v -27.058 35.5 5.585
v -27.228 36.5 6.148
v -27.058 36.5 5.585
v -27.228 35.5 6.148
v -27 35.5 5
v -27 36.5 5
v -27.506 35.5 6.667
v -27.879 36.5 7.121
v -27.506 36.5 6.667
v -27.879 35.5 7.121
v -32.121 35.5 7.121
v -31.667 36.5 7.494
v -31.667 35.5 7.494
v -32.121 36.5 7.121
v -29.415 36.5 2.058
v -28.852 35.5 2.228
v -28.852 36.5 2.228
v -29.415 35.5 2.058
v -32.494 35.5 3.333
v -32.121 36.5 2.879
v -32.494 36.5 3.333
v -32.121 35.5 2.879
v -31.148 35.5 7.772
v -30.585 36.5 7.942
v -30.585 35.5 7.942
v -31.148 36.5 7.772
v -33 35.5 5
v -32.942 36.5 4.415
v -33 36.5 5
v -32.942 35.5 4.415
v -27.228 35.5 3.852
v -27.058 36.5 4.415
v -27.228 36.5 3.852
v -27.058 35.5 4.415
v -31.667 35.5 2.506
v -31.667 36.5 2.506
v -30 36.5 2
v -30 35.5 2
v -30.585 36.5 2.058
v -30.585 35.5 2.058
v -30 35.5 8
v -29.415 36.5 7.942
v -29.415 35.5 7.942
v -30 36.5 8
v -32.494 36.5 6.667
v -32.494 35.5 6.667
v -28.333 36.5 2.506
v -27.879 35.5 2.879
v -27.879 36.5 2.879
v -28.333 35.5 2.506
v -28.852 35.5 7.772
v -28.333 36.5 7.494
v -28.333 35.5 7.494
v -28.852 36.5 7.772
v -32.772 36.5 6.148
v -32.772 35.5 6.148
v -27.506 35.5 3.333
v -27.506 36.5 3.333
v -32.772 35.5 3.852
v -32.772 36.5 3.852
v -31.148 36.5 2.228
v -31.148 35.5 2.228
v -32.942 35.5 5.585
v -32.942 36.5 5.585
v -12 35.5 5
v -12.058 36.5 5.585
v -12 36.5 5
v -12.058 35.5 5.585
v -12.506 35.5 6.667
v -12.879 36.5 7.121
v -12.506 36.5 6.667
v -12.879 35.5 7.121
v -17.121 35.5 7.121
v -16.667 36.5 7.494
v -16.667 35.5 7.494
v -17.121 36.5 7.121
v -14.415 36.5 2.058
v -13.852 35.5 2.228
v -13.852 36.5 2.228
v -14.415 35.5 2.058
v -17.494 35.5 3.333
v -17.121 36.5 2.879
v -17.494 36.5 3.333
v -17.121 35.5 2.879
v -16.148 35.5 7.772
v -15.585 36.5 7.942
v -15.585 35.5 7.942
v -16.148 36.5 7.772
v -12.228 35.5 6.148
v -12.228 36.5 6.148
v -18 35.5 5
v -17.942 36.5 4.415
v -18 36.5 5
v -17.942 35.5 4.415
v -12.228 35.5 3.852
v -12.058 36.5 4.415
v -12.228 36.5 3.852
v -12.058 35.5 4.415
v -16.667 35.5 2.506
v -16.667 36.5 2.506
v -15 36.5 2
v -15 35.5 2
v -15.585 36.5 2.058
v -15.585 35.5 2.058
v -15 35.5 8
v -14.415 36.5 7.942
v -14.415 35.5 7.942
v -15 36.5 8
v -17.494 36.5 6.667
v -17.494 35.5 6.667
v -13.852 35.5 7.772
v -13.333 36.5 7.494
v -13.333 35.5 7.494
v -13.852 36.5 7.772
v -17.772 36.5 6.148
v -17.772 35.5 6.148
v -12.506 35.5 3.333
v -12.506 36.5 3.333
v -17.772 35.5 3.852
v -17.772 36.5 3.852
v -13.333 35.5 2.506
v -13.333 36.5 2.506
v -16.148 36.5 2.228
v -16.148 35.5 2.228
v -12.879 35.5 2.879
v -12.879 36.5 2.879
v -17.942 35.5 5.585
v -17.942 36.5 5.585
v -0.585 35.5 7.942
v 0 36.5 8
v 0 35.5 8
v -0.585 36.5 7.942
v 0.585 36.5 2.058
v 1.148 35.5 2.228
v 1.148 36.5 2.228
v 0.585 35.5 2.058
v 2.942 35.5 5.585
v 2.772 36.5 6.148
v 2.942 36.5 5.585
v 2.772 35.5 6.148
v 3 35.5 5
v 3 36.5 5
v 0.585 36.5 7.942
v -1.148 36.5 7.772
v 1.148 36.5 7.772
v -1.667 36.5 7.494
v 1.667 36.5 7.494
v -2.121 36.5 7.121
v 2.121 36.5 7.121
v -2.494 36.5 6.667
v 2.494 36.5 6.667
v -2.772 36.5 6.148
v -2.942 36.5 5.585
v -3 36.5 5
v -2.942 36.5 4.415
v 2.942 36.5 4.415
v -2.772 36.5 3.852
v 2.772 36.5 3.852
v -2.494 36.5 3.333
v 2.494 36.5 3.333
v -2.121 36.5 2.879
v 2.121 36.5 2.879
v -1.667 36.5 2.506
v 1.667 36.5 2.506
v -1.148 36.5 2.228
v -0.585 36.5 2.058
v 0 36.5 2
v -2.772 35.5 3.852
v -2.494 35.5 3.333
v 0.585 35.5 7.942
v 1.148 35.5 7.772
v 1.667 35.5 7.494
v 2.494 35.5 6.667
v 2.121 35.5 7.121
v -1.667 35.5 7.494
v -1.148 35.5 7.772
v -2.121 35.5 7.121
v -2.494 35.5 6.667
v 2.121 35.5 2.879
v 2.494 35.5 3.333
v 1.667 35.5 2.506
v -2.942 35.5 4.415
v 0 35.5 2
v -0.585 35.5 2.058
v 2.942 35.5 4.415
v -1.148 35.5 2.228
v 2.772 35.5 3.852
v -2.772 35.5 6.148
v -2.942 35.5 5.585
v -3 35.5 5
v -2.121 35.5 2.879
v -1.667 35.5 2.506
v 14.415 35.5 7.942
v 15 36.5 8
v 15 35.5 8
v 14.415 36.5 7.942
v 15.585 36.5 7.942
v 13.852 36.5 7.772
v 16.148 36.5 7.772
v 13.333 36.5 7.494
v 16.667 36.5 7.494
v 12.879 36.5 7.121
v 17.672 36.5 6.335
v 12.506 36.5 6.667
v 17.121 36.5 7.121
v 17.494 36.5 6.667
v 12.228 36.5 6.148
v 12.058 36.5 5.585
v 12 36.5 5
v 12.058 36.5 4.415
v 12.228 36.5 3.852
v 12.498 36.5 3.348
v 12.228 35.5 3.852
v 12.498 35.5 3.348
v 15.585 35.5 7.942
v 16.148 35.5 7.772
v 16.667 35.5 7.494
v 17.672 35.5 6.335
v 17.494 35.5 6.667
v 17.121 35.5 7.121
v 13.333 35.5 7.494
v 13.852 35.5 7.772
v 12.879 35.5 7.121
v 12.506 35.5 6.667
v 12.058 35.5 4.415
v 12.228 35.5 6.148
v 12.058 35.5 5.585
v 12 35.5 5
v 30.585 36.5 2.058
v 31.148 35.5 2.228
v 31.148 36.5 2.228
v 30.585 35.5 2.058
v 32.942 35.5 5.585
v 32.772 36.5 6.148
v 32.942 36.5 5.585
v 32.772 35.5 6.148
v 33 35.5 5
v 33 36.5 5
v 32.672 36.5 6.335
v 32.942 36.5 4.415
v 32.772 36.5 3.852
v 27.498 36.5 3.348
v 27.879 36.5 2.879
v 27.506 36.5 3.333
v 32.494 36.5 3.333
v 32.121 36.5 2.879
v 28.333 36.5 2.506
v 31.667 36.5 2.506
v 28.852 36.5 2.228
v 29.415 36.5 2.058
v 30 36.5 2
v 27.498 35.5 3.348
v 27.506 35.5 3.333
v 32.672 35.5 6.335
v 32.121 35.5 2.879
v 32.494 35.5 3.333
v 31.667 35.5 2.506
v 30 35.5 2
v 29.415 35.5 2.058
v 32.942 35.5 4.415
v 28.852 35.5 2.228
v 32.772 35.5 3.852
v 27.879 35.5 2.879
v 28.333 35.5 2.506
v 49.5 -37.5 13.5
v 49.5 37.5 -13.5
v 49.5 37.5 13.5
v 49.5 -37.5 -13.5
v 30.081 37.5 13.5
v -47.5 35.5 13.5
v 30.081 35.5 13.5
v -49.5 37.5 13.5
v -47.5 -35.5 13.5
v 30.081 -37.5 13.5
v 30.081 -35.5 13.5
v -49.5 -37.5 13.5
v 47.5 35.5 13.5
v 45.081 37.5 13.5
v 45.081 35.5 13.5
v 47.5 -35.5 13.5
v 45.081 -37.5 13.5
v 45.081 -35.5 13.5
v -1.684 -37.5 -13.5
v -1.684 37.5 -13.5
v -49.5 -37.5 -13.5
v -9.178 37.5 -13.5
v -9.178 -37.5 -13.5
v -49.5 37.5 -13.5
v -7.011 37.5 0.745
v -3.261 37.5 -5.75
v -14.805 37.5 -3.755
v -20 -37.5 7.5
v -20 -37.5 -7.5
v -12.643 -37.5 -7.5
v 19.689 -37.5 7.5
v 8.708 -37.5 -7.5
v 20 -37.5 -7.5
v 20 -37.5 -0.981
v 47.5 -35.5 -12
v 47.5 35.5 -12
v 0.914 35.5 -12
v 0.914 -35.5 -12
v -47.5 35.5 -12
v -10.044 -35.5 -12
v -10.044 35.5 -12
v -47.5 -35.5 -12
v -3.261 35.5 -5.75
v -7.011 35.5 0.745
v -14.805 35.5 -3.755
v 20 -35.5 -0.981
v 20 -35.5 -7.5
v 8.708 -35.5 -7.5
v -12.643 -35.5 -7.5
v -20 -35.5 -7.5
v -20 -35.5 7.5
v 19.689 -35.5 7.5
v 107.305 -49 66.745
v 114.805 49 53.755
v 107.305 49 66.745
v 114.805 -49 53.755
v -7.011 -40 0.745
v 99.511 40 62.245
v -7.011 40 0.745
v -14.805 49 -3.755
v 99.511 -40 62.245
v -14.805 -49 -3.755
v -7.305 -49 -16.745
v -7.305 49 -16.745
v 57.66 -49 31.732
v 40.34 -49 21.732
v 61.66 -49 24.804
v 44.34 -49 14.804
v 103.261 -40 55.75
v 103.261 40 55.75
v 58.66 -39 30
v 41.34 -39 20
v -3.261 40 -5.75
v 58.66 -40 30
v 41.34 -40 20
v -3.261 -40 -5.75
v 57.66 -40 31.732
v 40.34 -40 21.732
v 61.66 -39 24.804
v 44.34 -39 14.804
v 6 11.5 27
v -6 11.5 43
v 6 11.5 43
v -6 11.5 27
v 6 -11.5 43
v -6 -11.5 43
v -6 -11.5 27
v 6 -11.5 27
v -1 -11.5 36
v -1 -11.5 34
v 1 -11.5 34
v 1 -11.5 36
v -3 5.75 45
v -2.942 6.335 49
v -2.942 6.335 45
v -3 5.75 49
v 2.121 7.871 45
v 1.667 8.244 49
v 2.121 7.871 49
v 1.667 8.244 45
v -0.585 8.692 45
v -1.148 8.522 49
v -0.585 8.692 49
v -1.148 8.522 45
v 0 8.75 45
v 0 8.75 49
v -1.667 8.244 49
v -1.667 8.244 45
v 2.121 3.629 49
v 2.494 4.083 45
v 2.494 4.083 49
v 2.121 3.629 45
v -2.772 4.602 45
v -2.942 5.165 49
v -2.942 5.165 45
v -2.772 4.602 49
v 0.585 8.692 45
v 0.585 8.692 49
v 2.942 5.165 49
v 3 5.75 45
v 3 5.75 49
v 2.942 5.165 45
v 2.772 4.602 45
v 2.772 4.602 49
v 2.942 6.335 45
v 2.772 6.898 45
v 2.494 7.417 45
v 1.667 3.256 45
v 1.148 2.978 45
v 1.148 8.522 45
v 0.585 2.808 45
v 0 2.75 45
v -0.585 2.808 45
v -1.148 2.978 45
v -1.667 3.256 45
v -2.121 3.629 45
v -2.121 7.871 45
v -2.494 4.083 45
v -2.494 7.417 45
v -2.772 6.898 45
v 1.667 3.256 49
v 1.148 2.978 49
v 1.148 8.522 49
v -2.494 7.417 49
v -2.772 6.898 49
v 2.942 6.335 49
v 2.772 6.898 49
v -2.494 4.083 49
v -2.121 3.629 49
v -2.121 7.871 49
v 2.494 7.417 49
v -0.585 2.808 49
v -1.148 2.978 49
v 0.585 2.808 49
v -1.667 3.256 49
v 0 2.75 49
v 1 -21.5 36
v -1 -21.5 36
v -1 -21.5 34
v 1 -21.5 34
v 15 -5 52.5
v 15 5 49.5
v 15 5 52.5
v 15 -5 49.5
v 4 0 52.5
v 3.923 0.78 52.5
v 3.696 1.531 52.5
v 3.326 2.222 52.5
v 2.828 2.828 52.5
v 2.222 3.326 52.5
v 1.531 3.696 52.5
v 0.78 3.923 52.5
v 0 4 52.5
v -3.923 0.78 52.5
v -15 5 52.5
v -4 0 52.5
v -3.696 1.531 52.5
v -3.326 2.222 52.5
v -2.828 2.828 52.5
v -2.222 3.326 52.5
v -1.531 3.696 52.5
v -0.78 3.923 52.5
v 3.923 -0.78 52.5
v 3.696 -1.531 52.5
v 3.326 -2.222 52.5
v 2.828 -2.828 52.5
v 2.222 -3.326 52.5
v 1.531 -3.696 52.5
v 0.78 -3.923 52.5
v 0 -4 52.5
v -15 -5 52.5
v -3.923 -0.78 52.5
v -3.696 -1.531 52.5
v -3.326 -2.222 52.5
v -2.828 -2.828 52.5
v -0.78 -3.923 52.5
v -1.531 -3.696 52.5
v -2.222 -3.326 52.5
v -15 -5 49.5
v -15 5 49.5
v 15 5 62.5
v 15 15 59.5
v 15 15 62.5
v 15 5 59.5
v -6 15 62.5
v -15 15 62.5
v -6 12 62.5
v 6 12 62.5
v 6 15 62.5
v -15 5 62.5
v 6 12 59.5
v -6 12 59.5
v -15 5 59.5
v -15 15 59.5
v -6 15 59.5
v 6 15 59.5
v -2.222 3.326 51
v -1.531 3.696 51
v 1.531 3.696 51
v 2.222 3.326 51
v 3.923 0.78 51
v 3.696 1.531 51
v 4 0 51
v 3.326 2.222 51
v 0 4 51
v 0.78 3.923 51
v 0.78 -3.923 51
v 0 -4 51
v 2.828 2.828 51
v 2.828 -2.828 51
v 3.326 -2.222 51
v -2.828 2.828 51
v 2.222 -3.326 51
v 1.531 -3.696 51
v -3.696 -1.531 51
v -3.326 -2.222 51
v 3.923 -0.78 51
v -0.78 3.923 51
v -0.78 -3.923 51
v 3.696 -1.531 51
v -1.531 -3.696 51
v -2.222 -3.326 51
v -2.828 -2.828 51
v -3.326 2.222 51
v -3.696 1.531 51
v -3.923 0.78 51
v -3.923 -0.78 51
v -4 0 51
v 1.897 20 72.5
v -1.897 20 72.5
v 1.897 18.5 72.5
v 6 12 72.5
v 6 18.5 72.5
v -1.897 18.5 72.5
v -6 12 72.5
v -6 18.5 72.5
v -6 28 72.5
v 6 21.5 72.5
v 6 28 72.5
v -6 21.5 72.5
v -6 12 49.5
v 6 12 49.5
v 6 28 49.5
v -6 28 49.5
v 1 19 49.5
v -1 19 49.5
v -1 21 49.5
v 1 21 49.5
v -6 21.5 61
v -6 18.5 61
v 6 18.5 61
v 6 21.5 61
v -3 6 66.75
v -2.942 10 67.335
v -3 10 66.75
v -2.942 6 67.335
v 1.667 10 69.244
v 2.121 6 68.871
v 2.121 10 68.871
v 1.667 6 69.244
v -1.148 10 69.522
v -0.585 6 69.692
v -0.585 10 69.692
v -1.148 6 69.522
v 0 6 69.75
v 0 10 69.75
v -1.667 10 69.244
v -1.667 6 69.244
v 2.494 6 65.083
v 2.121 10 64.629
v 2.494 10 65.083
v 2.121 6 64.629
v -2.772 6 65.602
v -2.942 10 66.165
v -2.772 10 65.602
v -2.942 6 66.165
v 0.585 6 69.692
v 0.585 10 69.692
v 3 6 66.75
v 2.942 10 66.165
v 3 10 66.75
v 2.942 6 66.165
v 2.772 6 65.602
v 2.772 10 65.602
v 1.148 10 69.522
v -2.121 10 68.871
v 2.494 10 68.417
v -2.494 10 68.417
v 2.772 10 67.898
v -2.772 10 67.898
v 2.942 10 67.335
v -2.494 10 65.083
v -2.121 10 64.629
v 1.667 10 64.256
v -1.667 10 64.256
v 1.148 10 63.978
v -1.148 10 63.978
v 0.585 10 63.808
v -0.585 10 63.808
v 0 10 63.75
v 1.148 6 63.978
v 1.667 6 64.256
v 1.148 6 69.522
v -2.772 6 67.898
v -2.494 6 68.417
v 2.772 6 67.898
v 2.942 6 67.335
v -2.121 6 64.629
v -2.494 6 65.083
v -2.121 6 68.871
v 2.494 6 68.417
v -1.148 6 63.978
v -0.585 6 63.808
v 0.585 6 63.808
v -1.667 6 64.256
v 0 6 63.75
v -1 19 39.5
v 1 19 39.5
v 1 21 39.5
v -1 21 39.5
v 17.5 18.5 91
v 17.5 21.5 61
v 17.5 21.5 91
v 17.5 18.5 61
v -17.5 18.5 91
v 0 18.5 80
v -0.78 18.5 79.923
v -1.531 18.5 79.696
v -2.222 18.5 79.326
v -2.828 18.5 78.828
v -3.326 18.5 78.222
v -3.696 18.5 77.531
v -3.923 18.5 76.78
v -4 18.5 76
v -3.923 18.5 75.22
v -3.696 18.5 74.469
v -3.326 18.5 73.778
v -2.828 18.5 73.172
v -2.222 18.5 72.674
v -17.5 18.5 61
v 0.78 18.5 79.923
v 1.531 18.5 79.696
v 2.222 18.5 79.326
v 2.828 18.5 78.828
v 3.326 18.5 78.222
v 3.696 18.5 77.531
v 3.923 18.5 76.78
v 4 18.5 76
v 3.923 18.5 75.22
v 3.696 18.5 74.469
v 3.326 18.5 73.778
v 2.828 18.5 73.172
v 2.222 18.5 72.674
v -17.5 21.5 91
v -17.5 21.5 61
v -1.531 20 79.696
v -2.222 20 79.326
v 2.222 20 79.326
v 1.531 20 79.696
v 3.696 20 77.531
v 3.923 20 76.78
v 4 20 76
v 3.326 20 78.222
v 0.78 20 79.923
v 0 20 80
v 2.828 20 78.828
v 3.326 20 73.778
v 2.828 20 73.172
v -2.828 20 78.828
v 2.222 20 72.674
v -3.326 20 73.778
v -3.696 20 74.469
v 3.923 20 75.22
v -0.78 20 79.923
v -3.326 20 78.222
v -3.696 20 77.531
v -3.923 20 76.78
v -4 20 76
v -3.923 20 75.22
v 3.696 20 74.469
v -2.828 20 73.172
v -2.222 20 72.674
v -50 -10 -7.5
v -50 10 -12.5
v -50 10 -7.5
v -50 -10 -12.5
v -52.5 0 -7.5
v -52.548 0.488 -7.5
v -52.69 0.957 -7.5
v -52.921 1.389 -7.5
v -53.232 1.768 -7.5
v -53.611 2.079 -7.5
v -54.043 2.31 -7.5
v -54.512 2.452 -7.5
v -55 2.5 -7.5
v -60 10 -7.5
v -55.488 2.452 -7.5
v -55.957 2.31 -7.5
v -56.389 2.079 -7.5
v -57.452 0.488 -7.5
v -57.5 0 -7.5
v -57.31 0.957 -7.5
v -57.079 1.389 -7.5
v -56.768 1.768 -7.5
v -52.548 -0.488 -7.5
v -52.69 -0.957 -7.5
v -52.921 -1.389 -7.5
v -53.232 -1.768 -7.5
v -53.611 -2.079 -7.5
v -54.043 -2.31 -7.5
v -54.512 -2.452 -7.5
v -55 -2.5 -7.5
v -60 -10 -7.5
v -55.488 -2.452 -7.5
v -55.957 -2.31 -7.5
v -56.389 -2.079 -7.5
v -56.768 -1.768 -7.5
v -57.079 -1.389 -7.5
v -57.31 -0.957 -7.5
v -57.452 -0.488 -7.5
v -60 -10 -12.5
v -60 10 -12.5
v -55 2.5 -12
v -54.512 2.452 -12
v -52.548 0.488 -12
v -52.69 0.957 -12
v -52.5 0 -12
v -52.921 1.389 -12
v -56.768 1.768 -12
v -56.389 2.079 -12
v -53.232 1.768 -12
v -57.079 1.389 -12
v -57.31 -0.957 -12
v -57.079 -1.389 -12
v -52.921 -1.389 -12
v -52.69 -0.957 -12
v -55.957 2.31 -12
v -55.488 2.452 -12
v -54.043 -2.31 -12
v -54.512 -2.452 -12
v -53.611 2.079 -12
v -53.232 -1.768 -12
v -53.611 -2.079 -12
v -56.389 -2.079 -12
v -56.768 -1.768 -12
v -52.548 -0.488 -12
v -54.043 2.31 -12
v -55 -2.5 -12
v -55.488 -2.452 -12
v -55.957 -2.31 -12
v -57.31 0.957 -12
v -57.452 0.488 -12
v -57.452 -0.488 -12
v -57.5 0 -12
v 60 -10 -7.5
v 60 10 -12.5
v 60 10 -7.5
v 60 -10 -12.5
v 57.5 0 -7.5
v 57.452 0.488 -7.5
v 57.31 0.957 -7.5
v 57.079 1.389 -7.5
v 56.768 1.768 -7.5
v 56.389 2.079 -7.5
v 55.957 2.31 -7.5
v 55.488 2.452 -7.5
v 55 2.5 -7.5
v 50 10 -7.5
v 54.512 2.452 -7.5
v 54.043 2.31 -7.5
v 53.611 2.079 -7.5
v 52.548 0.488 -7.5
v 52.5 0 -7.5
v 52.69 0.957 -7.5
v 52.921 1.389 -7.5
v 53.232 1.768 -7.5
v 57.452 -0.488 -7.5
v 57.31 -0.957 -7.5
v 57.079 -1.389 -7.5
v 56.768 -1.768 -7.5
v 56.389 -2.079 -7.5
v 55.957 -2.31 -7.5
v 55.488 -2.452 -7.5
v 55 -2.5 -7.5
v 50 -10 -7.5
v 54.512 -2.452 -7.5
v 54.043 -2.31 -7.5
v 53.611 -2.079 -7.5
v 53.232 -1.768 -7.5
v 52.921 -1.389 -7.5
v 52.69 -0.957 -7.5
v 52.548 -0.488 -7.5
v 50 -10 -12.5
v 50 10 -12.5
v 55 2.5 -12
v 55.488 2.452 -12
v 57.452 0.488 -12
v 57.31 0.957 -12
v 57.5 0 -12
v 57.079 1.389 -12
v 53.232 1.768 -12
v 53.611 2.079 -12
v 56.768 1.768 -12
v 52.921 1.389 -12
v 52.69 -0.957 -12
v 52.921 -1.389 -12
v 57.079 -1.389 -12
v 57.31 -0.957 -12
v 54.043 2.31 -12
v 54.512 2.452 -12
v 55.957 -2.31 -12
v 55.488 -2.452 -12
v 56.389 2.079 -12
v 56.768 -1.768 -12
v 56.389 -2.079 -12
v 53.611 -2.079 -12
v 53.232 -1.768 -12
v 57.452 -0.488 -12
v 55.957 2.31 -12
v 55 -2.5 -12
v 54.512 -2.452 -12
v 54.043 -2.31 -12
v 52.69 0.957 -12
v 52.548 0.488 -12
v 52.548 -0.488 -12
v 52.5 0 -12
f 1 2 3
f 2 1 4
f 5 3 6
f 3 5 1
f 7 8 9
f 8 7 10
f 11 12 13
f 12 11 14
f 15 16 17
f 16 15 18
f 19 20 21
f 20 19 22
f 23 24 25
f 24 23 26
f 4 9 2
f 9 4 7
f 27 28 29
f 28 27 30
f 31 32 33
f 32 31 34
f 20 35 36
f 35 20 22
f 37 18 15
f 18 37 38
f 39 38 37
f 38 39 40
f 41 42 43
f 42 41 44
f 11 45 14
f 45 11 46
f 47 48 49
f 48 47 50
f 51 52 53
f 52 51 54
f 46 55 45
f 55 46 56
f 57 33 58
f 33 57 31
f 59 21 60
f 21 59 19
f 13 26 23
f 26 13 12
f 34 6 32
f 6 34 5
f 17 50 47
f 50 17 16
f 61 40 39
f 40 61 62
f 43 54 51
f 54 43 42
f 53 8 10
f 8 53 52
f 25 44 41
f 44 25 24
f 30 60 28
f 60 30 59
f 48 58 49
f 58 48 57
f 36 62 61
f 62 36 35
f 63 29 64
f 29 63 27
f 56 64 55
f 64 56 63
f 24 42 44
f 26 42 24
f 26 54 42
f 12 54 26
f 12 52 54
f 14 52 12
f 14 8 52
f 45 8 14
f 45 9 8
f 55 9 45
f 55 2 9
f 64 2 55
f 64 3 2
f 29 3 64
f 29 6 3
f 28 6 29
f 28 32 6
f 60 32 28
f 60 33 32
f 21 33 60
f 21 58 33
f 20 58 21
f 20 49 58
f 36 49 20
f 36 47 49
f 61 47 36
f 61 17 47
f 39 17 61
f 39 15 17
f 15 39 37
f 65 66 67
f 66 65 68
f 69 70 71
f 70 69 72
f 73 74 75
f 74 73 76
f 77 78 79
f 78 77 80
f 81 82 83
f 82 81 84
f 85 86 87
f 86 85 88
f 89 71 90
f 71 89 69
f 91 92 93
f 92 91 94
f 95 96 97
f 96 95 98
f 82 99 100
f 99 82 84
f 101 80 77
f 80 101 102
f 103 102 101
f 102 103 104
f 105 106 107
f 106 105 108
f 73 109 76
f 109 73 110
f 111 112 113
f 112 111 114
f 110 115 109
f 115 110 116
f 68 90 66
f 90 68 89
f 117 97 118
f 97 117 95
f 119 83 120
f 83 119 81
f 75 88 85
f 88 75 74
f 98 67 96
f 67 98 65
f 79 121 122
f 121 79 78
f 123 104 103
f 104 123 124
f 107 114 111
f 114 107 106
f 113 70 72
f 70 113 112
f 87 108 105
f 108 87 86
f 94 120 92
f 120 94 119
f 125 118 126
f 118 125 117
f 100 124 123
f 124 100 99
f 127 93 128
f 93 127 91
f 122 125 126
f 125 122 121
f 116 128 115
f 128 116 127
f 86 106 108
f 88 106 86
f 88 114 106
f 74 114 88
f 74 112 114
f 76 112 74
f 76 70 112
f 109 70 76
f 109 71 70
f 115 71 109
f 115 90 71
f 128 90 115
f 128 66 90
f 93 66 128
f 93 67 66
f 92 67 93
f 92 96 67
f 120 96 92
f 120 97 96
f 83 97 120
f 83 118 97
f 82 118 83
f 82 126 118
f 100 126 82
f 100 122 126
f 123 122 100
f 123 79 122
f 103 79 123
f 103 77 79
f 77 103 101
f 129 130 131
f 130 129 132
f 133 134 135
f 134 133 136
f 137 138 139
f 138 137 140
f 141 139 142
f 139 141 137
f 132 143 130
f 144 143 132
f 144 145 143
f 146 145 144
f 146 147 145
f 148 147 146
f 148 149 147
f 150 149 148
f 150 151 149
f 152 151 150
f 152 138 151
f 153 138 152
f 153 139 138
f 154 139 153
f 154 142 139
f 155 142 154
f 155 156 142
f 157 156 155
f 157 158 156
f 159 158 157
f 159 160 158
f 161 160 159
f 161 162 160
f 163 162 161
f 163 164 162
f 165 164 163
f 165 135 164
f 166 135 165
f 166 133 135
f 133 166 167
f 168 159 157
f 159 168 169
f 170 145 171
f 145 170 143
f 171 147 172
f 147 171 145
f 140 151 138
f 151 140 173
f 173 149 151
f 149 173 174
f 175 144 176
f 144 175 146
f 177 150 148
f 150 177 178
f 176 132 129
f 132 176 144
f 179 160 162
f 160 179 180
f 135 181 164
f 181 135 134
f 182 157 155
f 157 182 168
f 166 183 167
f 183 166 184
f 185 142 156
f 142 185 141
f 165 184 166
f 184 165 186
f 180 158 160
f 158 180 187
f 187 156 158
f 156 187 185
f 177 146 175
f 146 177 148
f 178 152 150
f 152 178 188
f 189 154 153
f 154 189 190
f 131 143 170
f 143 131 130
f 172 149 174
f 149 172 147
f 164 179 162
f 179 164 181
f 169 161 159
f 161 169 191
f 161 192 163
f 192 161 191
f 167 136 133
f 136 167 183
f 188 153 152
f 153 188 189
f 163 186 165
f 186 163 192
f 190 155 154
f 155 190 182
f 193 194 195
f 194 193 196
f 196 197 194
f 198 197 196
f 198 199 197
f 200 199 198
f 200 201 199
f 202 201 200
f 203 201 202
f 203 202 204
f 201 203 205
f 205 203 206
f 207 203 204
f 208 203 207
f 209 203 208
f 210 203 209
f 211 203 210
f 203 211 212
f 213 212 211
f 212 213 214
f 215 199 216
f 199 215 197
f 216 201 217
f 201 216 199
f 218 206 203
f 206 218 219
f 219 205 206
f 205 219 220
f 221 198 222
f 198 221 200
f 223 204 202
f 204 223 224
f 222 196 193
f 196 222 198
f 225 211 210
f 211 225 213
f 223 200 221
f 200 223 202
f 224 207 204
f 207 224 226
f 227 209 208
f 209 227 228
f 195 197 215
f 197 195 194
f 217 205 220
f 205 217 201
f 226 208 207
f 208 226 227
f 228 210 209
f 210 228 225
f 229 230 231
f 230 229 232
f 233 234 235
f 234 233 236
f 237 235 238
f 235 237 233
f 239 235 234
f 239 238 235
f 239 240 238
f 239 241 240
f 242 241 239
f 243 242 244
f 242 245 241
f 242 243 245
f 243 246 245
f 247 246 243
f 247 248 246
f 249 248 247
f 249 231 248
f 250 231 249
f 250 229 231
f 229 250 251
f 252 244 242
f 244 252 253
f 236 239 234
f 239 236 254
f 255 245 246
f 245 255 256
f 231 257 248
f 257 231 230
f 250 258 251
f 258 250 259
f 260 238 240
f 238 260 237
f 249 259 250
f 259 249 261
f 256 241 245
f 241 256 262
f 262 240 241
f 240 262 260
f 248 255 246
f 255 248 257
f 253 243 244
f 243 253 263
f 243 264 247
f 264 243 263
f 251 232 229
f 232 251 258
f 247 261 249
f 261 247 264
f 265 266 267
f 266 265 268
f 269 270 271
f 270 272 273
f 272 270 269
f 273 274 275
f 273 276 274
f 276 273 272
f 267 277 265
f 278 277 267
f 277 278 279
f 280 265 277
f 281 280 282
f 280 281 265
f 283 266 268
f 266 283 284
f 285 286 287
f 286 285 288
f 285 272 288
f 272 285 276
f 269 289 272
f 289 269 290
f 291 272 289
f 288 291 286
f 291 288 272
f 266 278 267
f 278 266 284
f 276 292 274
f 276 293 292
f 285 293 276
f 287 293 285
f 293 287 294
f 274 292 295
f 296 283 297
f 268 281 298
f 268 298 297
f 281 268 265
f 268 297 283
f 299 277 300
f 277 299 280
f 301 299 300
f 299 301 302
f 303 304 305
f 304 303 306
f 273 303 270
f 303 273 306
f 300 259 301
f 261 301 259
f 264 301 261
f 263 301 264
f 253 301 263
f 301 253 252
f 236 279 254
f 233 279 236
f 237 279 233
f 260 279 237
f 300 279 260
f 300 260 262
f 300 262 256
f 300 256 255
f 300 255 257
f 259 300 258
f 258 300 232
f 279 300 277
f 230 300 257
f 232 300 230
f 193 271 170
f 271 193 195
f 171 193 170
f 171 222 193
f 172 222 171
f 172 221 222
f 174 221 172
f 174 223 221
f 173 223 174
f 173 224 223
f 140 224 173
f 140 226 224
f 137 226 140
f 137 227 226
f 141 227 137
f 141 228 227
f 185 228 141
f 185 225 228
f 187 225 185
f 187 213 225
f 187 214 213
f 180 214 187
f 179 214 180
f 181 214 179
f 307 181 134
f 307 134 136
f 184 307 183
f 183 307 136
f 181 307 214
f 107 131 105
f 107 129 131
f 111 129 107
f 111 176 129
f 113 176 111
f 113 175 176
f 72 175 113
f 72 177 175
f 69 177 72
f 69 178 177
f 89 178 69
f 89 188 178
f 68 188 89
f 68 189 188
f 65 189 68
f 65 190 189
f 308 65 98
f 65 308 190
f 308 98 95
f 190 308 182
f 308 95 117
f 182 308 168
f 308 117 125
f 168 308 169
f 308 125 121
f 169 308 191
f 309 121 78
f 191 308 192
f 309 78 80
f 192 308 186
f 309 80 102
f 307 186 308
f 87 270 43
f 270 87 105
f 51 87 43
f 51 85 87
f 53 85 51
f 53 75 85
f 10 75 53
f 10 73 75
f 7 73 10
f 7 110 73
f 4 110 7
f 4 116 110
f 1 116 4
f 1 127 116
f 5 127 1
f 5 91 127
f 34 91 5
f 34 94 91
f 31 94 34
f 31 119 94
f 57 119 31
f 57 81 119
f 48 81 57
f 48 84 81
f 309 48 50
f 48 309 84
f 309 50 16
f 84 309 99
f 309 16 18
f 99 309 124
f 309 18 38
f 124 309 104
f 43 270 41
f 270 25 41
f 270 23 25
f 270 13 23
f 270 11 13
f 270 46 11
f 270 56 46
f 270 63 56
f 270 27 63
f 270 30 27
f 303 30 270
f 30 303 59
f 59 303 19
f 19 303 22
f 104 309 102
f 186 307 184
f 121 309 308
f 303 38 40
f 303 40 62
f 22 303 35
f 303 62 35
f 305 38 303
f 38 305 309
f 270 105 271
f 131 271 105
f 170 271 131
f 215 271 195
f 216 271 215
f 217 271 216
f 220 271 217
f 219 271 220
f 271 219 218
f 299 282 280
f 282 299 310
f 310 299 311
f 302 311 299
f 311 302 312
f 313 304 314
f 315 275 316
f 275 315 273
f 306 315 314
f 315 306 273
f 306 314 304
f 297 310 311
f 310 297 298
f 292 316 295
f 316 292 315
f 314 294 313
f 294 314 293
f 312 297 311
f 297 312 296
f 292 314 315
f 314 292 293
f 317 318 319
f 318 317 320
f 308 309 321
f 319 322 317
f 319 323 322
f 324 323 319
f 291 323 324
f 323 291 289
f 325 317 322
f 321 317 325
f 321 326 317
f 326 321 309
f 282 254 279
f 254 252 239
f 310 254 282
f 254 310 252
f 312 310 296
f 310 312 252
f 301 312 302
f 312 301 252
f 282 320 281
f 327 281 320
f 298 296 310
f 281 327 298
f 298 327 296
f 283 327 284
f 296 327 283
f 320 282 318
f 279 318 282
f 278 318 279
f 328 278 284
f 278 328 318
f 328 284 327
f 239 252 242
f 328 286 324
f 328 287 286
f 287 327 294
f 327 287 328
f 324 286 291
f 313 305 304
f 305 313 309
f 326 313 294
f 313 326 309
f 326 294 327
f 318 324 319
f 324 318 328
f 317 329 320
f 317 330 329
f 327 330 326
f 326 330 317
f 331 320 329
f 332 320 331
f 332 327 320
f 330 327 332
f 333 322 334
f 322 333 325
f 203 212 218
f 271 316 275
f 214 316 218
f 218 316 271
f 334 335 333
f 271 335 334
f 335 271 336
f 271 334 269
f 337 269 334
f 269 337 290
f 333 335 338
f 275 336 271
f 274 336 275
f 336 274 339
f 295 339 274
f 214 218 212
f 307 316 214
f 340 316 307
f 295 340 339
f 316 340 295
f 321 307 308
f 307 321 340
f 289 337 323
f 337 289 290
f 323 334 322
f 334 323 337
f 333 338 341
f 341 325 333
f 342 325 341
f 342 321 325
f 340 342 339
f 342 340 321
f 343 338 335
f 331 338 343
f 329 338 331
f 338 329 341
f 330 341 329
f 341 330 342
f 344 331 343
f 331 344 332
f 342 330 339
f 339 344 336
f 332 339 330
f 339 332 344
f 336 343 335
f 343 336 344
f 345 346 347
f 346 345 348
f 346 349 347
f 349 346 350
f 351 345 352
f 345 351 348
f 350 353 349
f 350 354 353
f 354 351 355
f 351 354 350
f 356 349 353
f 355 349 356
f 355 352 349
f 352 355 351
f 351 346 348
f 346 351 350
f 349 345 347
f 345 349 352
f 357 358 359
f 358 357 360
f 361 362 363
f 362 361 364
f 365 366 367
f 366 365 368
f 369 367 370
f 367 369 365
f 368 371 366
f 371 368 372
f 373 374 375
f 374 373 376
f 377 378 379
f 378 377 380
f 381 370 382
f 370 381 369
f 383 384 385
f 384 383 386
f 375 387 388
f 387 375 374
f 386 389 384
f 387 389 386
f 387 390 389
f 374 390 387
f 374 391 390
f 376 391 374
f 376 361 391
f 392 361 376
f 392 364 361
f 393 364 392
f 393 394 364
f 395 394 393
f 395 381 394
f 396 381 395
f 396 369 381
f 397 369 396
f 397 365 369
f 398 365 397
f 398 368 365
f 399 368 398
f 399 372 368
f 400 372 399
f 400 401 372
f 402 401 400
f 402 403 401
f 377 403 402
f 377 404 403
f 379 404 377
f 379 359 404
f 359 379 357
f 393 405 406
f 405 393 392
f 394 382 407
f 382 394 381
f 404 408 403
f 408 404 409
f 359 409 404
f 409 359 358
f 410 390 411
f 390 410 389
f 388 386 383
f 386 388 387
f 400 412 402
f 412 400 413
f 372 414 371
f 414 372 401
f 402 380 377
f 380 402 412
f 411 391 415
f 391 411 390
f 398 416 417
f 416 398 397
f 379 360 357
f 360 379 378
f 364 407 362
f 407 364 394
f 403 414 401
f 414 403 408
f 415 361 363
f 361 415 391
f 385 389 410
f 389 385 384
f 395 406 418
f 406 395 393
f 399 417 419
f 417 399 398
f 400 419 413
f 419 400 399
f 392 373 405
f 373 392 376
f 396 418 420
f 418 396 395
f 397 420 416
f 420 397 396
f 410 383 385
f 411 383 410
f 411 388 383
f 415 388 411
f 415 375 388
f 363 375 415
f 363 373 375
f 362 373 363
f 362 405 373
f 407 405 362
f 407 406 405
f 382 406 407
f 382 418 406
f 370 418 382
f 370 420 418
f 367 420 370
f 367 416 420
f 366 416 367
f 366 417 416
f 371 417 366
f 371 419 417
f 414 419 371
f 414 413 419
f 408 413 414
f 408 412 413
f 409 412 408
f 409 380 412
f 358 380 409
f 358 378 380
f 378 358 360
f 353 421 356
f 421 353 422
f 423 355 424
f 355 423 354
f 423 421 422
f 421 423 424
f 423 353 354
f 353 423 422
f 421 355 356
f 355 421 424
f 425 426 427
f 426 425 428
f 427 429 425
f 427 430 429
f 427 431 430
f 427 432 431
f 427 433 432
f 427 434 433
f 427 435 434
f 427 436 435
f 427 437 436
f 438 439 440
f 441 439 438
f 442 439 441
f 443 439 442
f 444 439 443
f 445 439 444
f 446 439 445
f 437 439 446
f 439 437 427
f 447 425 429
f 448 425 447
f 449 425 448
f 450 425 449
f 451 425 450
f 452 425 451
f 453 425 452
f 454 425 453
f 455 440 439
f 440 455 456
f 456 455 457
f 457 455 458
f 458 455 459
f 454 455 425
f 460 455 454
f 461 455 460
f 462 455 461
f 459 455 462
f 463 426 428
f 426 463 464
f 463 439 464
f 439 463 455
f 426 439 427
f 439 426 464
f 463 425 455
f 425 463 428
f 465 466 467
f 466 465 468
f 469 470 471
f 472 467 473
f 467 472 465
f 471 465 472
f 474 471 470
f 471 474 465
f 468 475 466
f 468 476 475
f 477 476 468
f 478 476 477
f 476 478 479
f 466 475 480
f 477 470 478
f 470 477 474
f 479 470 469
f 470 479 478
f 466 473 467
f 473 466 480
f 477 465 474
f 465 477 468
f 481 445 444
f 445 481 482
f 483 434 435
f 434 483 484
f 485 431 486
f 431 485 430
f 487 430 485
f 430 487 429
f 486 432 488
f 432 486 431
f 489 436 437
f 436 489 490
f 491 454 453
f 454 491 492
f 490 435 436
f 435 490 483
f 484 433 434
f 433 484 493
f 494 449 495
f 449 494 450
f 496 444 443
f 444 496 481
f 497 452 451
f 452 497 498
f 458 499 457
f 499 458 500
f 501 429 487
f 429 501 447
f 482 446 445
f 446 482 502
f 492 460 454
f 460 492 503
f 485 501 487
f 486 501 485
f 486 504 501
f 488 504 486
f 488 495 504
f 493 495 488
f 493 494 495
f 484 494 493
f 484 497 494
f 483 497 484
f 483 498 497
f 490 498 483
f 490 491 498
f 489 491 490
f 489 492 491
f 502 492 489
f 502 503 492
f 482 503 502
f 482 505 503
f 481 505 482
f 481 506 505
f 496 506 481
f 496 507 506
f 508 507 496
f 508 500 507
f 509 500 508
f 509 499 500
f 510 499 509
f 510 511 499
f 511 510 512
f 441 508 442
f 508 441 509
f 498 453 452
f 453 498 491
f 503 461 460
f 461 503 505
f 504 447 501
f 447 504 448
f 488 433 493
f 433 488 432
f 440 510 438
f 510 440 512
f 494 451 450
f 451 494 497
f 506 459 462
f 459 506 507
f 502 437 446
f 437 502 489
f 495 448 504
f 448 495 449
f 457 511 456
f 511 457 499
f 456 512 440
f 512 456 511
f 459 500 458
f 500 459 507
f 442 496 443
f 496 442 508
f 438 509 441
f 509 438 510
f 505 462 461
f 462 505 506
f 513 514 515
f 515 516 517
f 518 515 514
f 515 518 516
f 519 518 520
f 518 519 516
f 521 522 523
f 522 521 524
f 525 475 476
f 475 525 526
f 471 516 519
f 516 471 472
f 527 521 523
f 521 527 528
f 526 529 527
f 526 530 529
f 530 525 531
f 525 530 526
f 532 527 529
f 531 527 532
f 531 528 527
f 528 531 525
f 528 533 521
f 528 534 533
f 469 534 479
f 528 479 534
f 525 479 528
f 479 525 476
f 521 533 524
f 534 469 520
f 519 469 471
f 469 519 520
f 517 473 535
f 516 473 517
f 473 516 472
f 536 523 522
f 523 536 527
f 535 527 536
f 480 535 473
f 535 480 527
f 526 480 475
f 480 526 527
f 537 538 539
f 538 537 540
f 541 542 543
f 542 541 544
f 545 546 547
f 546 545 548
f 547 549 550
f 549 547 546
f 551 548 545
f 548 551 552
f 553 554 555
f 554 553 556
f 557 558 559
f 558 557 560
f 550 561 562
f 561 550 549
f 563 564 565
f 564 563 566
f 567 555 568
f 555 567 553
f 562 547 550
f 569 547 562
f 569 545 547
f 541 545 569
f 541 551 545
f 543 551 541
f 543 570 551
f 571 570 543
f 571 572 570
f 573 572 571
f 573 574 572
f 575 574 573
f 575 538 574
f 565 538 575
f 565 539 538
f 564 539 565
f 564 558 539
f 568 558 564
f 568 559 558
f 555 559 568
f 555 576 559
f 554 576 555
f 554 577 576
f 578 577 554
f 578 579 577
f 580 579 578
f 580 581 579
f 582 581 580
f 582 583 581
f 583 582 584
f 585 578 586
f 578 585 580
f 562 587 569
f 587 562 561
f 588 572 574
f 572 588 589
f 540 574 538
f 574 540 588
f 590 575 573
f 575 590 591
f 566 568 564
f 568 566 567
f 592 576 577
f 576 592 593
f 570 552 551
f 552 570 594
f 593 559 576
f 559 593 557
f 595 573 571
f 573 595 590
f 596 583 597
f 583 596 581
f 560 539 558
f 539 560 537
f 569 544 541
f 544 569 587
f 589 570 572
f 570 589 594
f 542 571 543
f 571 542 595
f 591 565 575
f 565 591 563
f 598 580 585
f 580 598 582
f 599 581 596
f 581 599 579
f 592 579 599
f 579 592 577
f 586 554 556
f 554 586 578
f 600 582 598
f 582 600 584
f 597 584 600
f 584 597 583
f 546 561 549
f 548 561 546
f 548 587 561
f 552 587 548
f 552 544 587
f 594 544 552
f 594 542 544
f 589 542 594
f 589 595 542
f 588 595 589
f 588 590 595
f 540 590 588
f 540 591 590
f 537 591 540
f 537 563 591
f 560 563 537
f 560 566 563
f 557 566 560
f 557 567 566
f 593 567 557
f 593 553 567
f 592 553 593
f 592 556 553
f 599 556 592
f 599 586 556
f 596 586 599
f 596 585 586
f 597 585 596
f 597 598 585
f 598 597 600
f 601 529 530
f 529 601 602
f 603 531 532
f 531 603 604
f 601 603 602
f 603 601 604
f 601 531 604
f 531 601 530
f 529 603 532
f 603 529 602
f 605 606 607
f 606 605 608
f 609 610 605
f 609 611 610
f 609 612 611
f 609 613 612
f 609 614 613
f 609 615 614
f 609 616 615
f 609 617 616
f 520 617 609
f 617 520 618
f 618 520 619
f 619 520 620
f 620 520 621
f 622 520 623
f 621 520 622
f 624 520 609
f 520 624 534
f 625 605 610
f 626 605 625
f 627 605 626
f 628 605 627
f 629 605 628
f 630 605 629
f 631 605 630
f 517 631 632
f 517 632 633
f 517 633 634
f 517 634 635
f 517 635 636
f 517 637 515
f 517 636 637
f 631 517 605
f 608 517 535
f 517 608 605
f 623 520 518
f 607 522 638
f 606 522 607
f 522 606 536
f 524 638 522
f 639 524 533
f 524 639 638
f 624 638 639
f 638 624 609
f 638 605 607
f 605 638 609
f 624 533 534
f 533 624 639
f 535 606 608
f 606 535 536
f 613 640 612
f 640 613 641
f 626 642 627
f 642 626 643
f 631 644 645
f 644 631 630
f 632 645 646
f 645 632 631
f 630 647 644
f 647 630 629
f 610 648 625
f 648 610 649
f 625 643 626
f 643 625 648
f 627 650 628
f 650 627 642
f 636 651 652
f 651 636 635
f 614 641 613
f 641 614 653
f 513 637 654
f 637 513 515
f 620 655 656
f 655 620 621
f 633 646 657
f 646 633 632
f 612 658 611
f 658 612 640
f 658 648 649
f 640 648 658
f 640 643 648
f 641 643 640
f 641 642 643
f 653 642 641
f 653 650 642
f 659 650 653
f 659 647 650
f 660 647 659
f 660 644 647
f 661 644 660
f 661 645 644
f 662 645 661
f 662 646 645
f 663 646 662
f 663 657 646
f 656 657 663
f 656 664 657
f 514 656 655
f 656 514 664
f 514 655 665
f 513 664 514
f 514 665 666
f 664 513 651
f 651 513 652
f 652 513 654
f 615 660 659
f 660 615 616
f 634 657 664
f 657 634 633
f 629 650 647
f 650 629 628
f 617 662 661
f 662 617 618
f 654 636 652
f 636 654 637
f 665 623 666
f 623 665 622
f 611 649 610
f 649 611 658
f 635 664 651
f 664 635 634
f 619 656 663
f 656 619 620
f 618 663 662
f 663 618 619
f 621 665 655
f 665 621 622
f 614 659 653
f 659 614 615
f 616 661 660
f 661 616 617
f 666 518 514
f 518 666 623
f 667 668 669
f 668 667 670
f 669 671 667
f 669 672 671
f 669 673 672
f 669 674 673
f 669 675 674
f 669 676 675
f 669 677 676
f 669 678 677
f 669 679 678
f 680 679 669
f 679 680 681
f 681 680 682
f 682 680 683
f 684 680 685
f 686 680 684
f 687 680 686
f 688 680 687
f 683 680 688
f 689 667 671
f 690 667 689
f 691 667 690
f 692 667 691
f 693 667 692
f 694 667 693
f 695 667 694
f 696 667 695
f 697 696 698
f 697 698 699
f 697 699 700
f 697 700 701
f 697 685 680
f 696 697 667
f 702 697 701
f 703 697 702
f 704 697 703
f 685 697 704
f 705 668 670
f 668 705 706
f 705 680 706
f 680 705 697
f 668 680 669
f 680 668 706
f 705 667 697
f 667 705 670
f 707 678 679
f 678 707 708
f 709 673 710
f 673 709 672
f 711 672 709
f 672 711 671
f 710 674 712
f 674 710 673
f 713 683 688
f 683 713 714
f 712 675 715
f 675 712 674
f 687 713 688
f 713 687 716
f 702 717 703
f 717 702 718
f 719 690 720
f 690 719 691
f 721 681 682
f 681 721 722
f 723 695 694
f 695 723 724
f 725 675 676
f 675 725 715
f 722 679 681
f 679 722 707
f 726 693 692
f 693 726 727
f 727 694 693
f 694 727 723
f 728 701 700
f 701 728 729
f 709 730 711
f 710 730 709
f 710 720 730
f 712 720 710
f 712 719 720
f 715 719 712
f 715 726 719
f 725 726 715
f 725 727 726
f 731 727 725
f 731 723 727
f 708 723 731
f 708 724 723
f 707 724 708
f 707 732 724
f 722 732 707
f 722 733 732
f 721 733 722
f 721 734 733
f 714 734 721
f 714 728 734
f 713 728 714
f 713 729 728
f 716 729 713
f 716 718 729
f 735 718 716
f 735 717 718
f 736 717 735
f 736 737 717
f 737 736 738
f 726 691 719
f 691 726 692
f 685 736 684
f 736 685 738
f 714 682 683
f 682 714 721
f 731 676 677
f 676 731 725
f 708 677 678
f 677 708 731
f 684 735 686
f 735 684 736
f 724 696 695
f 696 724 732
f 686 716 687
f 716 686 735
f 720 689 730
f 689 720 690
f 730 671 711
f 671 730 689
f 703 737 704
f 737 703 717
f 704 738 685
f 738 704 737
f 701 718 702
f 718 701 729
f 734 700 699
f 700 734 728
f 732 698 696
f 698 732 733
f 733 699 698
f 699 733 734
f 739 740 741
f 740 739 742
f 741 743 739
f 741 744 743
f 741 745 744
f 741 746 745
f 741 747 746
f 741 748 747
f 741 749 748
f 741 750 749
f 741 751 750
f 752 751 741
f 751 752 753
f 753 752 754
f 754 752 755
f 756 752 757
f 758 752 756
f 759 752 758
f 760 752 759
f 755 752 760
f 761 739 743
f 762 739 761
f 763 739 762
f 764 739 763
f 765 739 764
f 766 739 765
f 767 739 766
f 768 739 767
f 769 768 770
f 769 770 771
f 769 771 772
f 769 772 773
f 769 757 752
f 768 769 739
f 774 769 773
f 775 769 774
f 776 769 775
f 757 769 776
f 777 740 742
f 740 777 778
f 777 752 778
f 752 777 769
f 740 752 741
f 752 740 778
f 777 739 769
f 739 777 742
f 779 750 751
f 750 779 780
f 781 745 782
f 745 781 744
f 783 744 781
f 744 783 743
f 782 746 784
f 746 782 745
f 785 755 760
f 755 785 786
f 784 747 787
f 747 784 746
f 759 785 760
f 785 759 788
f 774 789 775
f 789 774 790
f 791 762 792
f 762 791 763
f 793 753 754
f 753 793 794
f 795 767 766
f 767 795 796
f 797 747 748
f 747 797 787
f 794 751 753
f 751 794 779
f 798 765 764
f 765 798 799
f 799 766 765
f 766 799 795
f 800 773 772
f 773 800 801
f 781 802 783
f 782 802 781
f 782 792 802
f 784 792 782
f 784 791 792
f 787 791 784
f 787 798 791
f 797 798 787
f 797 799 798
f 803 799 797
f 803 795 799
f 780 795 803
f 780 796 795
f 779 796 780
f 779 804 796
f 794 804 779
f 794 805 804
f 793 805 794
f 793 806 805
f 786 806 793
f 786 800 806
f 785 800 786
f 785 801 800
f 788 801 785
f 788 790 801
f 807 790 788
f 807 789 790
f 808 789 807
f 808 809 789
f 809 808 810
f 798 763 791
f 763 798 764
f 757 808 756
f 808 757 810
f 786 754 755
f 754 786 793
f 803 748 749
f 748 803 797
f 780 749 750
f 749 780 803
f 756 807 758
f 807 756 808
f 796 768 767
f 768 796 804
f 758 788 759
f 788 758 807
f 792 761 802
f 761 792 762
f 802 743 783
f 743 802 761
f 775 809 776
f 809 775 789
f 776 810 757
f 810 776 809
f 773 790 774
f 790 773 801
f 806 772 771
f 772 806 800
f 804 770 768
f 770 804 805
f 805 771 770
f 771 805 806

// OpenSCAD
// Otto Mobile - Real Body v0.2
// Functional design to hold actual hardware

$fn = 32;

// Real component dimensions
OP5P_LENGTH = 85;
OP5P_WIDTH = 56;
OP5P_HEIGHT = 20; // with some clearance

SCREEN_WIDTH = 121;
SCREEN_HEIGHT = 78;
SCREEN_DEPTH = 8;

SERVO_WIDTH = 12;
SERVO_LENGTH = 23;
SERVO_HEIGHT = 22;

CAMERA_WIDTH = 25;
CAMERA_HEIGHT = 25;

WALL_THICKNESS = 2;

module orange_pi_5_pro() {
    color("limegreen")
    cube([OP5P_LENGTH, OP5P_WIDTH, 15], center=true);
    
    // Ports visualization (one side)
    translate([0, OP5P_WIDTH/2 + 2, 0])
    color("silver")
    cube([30, 4, 8], center=true);
}

module display_5inch() {
    // PCB
    color("darkgreen")
    cube([SCREEN_WIDTH + 10, SCREEN_HEIGHT + 10, 2], center=true);
    
    // Visible screen
    color("black")
    translate([0, 0, 1.1])
    cube([SCREEN_WIDTH, SCREEN_HEIGHT, 0.5], center=true);
}

module servo_sg90() {
    union() {
        // Main body
        color("blue")
        cube([SERVO_LENGTH, SERVO_WIDTH, SERVO_HEIGHT - 6], center=true);
        
        // Top shaft
        translate([SERVO_LENGTH/4, 0, (SERVO_HEIGHT - 6)/2 + 2])
        color("white")
        cylinder(h=4, r=3);
        
        // Wire
        translate([-SERVO_LENGTH/2 - 5, 0, 0])
        color("red")
        cube([10, 2, 2], center=true);
    }
}

module arducam() {
    cube([CAMERA_WIDTH, CAMERA_WIDTH, 5], center=true);
    // Lens
    translate([0, 0, 2.5])
    cylinder(h=3, r=6);
}

// ============= BODY DESIGN =============

module body_base() {
    // Main compartment for Orange Pi
    inner_l = OP5P_LENGTH + 10;
    inner_w = OP5P_WIDTH + 15;
    inner_h = OP5P_HEIGHT + 5;
    
    difference() {
        // Outer shell
        cube([inner_l + WALL_THICKNESS*2, 
              inner_w + WALL_THICKNESS*2, 
              inner_h + WALL_THICKNESS], 
             center=true);
        
        // Inner cutout
        translate([0, 0, WALL_THICKNESS/2])
        cube([inner_l, inner_w, inner_h + 1], center=true);
        
        // Port access (back)
        translate([0, -inner_w/2 - 1, 0])
        cube([40, WALL_THICKNESS*2, 15], center=true);
        
        // Ventilation slots
        for (i = [-2:2]) {
            translate([i * 15, inner_w/2 + 1, 5])
            rotate([90, 0, 0])
            cylinder(h=WALL_THICKNESS*2, r=3);
        }
    }
    
    // Orange Pi (inside)
    translate([0, 0, -inner_h/2 + OP5P_HEIGHT/2 - 3])
    %orange_pi_5_pro();
}

module display_housing() {
    // Frame for 5" display (acts as Otto's "face")
    frame_w = SCREEN_WIDTH + 20;
    frame_h = SCREEN_HEIGHT + 20;
    
    difference() {
        // Frame
        cube([frame_w, frame_h, 15], center=true);
        
        // Screen cutout
        translate([0, 0, 5])
        cube([SCREEN_WIDTH + 2, SCREEN_HEIGHT + 2, 10], center=true);
        
        // Cable slot
        translate([0, -frame_h/2 + 5, -2])
        cube([20, 10, 8], center=true);
    }
    
    // Display (inside)
    translate([0, 0, 3])
    %display_5inch();
}

module pan_tilt_head() {
    // Pan servo base
    translate([0, 0, 0])
    rotate([0, 0, 90])
    servo_sg90();
    
    // Tilt mechanism
    translate([0, 0, SERVO_HEIGHT - 6])
    union() {
        // L-bracket (simplified)
        color("gray")
        difference() {
            union() {
                cube([30, 10, 3], center=true);
                translate([0, 10, 10])
                cube([30, 10, 3], center=true);
            }
            // Servo horn hole
            cylinder(h=10, r=4);
        }
        
        // Tilt servo
        translate([0, 20, 10])
        rotate([90, 0, 0])
        rotate([0, 0, 90])
        servo_sg90();
        
        // Camera mount
        translate([0, 20, 25])
        rotate([90, 0, 0]) {
            // Mount plate
            color("gray")
            difference() {
                cube([35, 30, 3], center=true);
                cylinder(h=10, r=4);
            }
            // Camera
            translate([0, 0, 5])
            %arducam();
        }
    }
}

module full_assembly() {
    // Body base (Orange Pi compartment)
    translate([0, 0, 0])
    body_base();
    
    // Display face (front, angled up)
    translate([50, 0, 25])
    rotate([0, -30, 0])
    display_housing();
    
    // Pan-tilt head (top)
    translate([0, 0, 35])
    pan_tilt_head();
    
    // Mounting tabs for morral/strap
    for (side = [-1, 1]) {
        translate([side * 55, 0, -10])
        color("orange")
        difference() {
            cube([10, 20, 5], center=true);
            translate([0, 0, -2])
            cylinder(h=10, r=2.5);
        }
    }
}

// Render
full_assembly();

// Exploded view (uncomment to see)
//translate([0, 80, 0]) body_base();
//translate([80, 0, 0]) display_housing();
//translate([160, 0, 0]) pan_tilt_head();
